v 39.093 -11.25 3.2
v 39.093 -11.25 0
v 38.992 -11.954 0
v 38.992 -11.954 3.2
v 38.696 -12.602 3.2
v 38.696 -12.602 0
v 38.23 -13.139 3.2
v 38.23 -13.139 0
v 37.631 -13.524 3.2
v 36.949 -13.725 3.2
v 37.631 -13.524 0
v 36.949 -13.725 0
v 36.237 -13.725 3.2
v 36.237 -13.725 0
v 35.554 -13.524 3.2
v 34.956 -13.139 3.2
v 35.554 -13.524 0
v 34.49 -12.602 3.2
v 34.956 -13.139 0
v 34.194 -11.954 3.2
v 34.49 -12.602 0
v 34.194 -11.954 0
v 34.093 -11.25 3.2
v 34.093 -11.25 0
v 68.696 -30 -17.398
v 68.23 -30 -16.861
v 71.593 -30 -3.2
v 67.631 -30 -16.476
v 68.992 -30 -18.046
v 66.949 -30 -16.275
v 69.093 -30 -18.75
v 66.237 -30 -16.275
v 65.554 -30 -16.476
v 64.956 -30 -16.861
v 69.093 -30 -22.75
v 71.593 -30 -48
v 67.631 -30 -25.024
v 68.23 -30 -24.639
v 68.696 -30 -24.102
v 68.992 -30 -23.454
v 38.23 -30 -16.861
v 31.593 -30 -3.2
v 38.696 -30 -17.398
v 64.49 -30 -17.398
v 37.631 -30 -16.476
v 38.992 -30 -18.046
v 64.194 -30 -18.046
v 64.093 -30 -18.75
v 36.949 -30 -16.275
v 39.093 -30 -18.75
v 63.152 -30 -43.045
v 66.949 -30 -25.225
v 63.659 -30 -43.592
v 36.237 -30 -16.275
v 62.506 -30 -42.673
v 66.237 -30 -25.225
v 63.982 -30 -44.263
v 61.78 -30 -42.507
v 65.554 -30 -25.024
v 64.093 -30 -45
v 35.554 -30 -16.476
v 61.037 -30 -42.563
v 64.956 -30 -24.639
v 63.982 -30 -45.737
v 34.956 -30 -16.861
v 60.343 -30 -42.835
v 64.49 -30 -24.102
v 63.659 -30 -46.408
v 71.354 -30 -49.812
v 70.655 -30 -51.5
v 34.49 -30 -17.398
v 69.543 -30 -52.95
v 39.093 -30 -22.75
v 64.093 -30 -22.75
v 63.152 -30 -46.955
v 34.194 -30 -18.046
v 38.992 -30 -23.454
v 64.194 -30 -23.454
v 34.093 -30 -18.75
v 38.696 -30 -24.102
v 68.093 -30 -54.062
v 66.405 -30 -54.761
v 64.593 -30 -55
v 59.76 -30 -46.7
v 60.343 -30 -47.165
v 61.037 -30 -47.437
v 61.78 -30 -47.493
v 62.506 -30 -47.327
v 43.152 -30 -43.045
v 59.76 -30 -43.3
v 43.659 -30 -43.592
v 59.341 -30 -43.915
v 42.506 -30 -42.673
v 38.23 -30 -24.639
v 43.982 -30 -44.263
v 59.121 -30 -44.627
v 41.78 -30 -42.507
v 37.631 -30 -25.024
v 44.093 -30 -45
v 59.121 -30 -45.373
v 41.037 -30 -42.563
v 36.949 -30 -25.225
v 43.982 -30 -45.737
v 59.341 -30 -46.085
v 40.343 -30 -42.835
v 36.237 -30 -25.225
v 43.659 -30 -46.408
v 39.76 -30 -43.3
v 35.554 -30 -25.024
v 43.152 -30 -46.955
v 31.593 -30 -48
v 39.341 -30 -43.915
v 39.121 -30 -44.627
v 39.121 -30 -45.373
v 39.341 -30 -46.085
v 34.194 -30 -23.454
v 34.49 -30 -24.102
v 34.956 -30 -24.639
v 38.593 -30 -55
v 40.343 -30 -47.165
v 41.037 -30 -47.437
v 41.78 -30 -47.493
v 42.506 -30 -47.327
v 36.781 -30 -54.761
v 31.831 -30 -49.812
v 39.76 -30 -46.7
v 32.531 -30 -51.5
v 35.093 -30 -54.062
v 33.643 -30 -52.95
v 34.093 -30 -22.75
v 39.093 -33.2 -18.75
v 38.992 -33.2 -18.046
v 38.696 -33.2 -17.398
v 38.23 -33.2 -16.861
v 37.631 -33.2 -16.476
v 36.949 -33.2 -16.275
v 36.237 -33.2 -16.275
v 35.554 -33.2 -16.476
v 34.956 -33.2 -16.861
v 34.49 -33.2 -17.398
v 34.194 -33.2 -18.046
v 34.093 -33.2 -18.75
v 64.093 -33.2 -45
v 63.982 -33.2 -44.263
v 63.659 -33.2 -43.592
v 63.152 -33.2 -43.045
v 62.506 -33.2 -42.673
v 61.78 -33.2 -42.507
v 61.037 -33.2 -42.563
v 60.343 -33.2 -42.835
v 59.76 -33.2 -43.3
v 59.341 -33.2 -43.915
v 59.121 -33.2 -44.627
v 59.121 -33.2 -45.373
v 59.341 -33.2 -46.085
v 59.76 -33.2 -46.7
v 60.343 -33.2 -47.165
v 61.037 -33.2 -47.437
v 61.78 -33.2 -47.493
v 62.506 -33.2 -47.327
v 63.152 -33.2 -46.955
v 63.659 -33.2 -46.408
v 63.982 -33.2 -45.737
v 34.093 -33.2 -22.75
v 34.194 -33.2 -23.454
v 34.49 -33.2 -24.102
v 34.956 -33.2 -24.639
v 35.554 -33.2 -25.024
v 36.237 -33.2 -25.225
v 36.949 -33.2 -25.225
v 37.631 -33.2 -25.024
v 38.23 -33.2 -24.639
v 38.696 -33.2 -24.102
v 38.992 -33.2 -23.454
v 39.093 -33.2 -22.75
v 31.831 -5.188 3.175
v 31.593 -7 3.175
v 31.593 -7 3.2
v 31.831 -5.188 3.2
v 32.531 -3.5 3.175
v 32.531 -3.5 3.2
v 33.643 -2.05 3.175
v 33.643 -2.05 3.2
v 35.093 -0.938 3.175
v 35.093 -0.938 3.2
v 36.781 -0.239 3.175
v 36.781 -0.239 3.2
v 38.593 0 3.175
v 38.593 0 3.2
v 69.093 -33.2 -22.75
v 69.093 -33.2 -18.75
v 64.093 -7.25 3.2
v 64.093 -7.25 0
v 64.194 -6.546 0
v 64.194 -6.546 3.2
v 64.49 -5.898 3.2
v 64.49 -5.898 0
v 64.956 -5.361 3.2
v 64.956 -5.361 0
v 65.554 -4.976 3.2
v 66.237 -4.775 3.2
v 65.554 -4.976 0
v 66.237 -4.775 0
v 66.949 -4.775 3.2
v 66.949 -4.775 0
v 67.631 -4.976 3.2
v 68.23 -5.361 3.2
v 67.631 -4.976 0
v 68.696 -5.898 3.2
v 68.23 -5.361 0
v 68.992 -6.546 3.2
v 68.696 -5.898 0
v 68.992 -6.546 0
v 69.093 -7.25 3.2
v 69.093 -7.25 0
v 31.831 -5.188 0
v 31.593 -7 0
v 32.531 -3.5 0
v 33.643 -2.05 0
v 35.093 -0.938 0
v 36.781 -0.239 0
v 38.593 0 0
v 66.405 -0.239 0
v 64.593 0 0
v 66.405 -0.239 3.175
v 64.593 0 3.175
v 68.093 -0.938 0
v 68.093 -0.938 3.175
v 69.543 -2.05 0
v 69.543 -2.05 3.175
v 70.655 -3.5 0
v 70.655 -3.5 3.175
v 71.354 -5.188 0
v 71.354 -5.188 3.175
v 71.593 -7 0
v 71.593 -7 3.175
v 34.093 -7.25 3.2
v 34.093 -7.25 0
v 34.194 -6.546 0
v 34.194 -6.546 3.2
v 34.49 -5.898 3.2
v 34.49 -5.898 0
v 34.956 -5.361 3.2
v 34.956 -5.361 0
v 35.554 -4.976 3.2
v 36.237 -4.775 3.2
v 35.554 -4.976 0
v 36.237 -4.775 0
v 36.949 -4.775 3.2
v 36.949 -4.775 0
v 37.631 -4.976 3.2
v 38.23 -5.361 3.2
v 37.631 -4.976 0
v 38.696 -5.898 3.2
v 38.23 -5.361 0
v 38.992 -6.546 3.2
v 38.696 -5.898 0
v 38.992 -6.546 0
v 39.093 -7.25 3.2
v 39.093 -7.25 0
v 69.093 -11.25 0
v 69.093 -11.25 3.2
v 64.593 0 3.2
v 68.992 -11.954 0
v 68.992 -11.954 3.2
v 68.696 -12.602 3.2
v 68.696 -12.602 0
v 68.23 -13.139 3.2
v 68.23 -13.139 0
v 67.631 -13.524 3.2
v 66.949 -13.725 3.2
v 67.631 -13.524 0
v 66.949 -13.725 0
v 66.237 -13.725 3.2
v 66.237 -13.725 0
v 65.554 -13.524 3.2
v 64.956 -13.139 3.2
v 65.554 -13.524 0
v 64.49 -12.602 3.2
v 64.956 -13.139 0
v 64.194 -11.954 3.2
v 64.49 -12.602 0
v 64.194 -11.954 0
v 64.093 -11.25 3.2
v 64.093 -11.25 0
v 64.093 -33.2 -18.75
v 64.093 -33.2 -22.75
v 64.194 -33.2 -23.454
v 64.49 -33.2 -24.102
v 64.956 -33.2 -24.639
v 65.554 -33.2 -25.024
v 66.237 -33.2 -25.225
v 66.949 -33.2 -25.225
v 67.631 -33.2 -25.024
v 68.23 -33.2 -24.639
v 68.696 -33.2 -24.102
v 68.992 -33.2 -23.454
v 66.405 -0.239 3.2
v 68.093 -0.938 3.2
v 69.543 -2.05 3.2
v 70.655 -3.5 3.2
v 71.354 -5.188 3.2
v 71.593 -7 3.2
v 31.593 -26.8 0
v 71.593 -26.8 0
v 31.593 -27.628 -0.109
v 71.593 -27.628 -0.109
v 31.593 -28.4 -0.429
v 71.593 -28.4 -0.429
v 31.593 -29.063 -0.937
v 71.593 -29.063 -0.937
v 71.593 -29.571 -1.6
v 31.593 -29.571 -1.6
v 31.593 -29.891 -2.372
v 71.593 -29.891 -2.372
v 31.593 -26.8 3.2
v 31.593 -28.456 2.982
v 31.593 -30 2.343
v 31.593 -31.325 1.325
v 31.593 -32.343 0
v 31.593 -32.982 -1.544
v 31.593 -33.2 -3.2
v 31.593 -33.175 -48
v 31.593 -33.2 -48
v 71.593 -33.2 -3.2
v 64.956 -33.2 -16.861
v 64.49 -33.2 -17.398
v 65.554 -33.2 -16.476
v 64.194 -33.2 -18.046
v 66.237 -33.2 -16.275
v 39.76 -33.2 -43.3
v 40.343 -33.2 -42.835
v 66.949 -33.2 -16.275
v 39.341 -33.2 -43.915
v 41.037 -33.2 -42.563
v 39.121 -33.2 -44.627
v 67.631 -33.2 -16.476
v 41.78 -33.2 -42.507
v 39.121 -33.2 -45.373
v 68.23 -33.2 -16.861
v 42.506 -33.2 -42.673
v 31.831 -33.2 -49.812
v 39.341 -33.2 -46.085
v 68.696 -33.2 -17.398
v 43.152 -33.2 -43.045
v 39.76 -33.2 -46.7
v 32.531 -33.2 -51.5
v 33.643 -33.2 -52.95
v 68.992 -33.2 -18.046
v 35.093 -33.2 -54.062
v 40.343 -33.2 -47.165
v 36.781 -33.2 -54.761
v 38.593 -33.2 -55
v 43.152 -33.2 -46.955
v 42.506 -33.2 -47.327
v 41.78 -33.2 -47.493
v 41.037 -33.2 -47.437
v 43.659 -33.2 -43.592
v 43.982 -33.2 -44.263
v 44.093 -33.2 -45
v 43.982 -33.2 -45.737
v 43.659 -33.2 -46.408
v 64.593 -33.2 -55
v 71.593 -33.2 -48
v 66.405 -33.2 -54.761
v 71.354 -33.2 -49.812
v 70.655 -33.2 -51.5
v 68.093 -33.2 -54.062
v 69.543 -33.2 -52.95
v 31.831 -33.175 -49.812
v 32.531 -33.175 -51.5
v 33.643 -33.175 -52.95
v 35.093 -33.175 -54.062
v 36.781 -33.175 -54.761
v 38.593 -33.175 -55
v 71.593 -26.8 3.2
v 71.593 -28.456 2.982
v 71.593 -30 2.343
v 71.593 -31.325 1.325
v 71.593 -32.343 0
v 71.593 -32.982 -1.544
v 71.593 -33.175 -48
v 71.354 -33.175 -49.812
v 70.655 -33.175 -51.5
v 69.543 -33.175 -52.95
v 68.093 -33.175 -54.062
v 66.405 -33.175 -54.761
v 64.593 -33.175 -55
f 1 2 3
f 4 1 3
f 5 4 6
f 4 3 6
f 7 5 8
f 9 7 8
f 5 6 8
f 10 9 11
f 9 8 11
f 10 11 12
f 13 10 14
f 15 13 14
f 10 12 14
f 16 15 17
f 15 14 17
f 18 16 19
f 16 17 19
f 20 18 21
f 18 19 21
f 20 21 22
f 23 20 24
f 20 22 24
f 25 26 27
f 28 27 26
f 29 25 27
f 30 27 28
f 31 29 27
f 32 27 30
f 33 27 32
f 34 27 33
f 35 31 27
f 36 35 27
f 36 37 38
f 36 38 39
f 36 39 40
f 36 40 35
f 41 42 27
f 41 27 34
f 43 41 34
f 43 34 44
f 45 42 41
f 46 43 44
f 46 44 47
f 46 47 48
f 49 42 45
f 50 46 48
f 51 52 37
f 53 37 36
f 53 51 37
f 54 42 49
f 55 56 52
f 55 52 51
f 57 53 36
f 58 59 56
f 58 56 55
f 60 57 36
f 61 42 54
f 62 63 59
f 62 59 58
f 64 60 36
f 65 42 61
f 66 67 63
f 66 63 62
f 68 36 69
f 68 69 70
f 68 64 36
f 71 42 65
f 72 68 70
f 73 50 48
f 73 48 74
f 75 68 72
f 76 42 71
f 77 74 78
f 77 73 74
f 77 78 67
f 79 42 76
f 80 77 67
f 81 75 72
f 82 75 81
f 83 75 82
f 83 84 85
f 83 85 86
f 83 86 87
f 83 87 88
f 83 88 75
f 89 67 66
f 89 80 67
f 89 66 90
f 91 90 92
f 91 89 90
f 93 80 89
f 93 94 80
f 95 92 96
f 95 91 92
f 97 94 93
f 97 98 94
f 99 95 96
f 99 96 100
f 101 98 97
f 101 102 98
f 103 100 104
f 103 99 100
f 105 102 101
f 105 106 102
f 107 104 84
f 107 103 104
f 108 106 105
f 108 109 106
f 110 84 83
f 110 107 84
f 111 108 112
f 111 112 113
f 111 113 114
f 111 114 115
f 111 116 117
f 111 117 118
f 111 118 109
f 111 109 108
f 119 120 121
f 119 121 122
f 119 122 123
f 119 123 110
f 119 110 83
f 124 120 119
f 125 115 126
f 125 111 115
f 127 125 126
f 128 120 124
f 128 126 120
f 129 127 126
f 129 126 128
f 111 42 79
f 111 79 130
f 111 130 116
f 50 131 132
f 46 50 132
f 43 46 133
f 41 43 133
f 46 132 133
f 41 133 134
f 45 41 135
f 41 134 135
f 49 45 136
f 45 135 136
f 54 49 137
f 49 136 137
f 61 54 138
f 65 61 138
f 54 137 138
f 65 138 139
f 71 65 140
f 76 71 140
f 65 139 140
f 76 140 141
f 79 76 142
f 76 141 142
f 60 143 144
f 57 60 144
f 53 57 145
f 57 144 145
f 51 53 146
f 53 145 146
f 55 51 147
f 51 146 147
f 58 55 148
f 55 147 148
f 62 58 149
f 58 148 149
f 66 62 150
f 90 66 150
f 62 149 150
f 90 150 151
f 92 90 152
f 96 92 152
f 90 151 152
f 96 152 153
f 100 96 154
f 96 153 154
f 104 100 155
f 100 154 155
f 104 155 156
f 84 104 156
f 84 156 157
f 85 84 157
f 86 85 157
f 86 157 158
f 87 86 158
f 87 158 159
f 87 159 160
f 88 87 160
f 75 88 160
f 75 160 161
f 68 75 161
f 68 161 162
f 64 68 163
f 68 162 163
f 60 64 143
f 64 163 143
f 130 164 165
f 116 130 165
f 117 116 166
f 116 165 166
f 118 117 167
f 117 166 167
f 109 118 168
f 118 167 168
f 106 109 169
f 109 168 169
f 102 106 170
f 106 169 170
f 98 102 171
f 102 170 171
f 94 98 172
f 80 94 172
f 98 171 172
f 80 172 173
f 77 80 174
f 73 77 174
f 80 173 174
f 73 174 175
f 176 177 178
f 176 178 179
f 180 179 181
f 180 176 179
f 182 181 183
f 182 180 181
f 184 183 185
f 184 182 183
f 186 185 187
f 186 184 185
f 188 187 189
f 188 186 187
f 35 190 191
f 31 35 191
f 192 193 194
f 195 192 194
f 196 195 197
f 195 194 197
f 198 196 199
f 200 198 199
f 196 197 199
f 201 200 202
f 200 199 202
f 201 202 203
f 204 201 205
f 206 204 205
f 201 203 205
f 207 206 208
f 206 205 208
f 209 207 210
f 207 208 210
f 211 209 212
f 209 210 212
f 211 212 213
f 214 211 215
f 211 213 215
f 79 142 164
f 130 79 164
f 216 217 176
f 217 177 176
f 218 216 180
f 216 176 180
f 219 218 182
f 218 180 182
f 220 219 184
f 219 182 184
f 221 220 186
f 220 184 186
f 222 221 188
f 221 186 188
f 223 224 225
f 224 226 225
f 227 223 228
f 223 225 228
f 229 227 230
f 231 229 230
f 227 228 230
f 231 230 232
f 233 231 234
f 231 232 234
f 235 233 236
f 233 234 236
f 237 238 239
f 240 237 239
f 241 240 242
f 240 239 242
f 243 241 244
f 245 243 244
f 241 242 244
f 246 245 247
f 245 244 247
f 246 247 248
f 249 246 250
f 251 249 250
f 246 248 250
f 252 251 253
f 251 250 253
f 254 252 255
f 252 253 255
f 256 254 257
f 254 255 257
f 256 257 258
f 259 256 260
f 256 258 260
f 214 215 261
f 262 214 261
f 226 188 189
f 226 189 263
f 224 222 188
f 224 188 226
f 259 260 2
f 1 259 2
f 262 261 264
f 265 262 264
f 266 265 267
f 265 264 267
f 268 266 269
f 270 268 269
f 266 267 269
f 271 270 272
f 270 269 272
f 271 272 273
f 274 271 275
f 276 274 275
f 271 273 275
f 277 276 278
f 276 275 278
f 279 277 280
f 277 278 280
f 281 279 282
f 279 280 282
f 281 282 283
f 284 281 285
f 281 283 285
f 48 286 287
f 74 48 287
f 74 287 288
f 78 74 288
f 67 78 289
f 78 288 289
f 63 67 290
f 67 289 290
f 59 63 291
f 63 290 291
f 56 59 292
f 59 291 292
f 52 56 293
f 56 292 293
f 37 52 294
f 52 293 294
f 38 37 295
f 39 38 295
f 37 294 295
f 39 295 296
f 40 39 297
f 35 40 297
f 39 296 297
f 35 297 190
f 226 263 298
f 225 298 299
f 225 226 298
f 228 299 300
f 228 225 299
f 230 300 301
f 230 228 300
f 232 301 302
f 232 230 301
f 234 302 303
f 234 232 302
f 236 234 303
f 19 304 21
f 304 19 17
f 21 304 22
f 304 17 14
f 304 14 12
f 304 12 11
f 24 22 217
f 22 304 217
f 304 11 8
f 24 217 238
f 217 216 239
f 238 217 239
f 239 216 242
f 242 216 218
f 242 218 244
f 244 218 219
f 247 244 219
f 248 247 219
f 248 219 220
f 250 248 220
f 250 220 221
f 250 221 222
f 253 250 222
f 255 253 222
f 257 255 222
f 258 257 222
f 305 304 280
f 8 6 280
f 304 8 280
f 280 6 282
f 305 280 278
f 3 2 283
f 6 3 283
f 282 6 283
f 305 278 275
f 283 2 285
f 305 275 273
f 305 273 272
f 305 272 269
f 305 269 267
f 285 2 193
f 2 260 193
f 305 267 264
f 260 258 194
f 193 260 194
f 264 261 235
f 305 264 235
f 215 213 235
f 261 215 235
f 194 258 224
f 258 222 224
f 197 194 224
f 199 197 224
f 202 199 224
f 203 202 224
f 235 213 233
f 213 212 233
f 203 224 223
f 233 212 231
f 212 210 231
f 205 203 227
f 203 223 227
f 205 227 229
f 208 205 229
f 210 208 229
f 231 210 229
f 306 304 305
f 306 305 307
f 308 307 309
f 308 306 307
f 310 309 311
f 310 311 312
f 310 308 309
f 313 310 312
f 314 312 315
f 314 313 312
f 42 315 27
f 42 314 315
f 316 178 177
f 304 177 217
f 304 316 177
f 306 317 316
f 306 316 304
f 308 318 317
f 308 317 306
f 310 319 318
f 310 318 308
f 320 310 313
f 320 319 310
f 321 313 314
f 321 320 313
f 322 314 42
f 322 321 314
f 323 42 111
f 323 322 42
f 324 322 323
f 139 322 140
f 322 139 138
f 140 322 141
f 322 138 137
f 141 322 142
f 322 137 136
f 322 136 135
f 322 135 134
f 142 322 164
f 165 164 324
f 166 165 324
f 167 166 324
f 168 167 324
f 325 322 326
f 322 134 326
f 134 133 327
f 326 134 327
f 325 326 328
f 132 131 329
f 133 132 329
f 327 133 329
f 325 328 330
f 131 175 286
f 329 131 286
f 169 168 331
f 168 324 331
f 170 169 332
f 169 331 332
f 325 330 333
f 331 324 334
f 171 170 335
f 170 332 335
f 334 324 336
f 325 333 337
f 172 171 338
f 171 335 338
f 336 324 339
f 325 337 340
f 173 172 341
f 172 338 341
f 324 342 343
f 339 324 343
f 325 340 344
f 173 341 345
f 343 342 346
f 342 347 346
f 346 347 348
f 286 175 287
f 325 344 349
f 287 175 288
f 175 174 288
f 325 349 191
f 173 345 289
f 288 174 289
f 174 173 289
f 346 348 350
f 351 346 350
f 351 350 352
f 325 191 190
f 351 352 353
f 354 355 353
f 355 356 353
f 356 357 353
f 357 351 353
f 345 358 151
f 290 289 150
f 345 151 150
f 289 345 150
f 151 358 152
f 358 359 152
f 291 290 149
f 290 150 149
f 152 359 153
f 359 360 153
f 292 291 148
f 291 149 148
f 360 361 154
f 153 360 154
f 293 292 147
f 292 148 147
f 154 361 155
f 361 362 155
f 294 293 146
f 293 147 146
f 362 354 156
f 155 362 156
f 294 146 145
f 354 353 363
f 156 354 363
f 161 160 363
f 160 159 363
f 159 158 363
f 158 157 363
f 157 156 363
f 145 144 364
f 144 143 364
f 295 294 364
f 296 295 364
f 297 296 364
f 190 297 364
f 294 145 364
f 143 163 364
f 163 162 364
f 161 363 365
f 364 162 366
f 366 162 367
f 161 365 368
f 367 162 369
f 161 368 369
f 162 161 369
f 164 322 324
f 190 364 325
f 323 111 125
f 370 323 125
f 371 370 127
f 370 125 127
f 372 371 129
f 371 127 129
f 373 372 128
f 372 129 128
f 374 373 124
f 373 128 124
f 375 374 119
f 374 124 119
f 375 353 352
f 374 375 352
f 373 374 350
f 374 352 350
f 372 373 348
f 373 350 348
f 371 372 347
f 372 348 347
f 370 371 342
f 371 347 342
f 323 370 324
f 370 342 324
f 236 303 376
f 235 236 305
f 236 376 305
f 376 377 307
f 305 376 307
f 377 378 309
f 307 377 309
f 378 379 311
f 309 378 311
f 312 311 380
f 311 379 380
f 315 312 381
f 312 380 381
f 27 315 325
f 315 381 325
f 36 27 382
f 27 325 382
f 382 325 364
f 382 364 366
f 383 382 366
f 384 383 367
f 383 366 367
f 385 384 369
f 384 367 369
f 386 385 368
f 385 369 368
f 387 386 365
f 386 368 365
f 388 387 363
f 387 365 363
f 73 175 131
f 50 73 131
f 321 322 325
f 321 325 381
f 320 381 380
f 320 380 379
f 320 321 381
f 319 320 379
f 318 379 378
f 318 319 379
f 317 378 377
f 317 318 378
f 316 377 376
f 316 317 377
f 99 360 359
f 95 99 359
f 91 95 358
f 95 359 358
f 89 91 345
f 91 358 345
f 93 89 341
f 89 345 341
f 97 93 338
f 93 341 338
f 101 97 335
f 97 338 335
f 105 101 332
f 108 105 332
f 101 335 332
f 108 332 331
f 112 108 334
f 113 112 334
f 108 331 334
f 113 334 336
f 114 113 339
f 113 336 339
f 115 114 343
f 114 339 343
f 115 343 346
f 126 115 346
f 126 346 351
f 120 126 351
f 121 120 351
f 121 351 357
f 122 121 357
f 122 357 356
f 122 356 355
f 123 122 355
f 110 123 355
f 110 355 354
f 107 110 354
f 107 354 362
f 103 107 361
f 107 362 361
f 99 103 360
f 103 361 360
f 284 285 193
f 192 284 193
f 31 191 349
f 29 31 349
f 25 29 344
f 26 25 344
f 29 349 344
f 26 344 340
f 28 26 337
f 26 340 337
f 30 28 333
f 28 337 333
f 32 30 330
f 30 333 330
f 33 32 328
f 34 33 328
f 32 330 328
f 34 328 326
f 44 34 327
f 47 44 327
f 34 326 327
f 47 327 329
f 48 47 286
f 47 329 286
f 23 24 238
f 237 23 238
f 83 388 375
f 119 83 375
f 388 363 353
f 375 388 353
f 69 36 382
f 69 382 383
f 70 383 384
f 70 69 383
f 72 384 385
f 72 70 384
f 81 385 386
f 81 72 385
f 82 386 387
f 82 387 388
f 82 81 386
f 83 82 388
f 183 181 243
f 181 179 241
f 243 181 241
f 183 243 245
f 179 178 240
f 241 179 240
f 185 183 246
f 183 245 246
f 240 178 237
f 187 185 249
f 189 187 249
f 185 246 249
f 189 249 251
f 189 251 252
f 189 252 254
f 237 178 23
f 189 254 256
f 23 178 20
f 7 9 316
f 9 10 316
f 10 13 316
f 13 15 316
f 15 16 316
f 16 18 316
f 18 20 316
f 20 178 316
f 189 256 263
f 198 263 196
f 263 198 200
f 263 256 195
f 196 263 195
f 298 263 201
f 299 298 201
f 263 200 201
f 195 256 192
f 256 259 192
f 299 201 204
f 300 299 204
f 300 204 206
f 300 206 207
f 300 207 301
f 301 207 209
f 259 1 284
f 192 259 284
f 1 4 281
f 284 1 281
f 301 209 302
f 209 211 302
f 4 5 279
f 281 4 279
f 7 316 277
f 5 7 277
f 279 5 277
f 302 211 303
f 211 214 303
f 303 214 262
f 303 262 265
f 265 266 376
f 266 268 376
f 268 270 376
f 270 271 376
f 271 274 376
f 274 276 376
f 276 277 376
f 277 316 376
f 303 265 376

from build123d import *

# Parameters (mm, degrees)
SKETCH1_W                  = 39.999999999
SKETCH1_H                  = 30
BOSS_EXTRUDE1_DEPTH        = 3.175
SKETCH3_W                  = 3.175
SKETCH3_H                  = 3.175
SKETCH3_W_2                = 25
BOSS_EXTRUDE2_DEPTH        = 40
SKETCH4_R                  = 2.5
CUT_EXTRUDE1_DEPTH         = 10
FILLET1_R                  = 7
CONVERT_SOLID1_START       = -32.140684808
CONVERT_SOLID1_OUTLINE_R   = 2.5
CONVERT_SOLID1_DEPTH       = 5.340684808
CONVERT_SOLID1_START_2     = -33.2
CONVERT_SOLID1_2_OUTLINE_R = 2.5
CONVERT_SOLID1_2_DEPTH     = 0.025
CONVERT_SOLID1_START_3     = -27.475968
CONVERT_SOLID1_3_OUTLINE_W = 39.999999999
CONVERT_SOLID1_3_OUTLINE_H = 0.025
CONVERT_SOLID1_3_DEPTH     = 27.475968
CONVERT_SOLID1_START_4     = 31.592932584
CONVERT_SOLID1_4_DEPTH     = 39.999999999
CONVERT_SOLID1_START_5     = -49
CONVERT_SOLID1_5_OUTLINE_W = 39.999999999
CONVERT_SOLID1_5_OUTLINE_H = 3.2
CONVERT_SOLID1_5_DEPTH     = 2.85856
CONVERT_SOLID1_START_6     = 3.175
CONVERT_SOLID1_6_DEPTH     = 0.825


with BuildPart() as part:
    # Sketch1 → Boss-Extrude1 (new body)
    with BuildSketch(Plane.XY):
        with Locations((51.592932584, -15)):
            Rectangle(SKETCH1_W, SKETCH1_H)
        with BuildLine():
            Line((34.092932584, -11.25), (34.092932584, -7.25))
            ThreePointArc((34.092932584, -7.25), (36.592932584, -4.75), (39.092932584, -7.25))
            Line((39.092932584, -7.25), (39.092932584, -11.25))
            ThreePointArc((39.092932584, -11.25), (36.592932584, -13.75), (34.092932584, -11.25))
        make_face(mode=Mode.SUBTRACT)
        with BuildLine():
            Line((64.092932583, -11.25), (64.092932583, -7.25))
            ThreePointArc((64.092932583, -7.25), (66.592932583, -4.75), (69.092932583, -7.25))
            Line((69.092932583, -7.25), (69.092932583, -11.25))
            ThreePointArc((69.092932583, -11.25), (66.592932583, -13.75), (64.092932583, -11.25))
        make_face(mode=Mode.SUBTRACT)
    extrude(amount=BOSS_EXTRUDE1_DEPTH)


with BuildPart() as body_2:
    # Mirror1: mirrored copy
    add(part.part.mirror(Plane(origin=(0, -15, -15), x_dir=(0, -0.7071067811865465, 0.7071067811865486), z_dir=(0, -0.7071067811865488, -0.7071067811865464))))


with BuildPart() as part_1:
    add(part.part)

    add(body_2.part)  # Boss-Extrude2 merges body 2
    # Sketch3 → Boss-Extrude2 (add, through all)
    with BuildSketch(Plane(origin=(71.592932583, 0, 0), x_dir=(0, 0, -1), z_dir=(1, 0, 0))):
        with Locations((-1.5875, -31.5875)):
            Rectangle(SKETCH3_W, SKETCH3_H)
        with Locations((42.5, -31.5875)):
            Rectangle(SKETCH3_W_2, SKETCH3_H)
    extrude(amount=-BOSS_EXTRUDE2_DEPTH)

    # Sketch4 → Cut-Extrude1 (cut)
    with BuildSketch(Plane.XZ.offset(33.175)):
        with Locations((61.592932583, -45)):
            Circle(SKETCH4_R)
        with Locations((41.592932584, -45)):
            Circle(SKETCH4_R)
    extrude(amount=-CUT_EXTRUDE1_DEPTH, mode=Mode.SUBTRACT)

    # Fillet1
    fillet1_edges = [part_1.edges().sort_by_distance(p)[0] for p in [
        (31.592932584, 0, 1.5875),
        (71.592932583, 0, 1.5875),
        (71.592932583, -31.5875, -55),
        (31.592932583, -31.5875, -55),
    ]]
    fillet(fillet1_edges, radius=FILLET1_R)

    # Convert-Solid1: read off the stored shape, not the designer's step
    # Convert-Solid1 outline → Convert-Solid1 (add)
    with BuildSketch(Plane(origin=(0, 0, 0), x_dir=(1, 0, 0), z_dir=(0, 1, 0)).offset(CONVERT_SOLID1_START)):
        with BuildLine():
            Line((31.592932584, 48), (31.592932584, 0))
            Line((31.592932584, 0), (71.592932583, 0))
            Line((71.592932583, 0), (71.592932583, 48))
            ThreePointArc((71.592932583, 48), (69.542680051, 52.949747468), (64.592932583, 55))
            Line((64.592932583, 55), (38.592932584, 55))
            ThreePointArc((38.592932584, 55), (33.643185116, 52.949747469), (31.592932584, 48))
        make_face()
        with BuildLine():
            ThreePointArc((34.092932584, 22.75), (36.592932584, 25.25), (39.092932584, 22.75))
            Line((39.092932584, 22.75), (39.092932584, 18.75))
            ThreePointArc((39.092932584, 18.75), (36.592932584, 16.25), (34.092932584, 18.75))
            Line((34.092932584, 18.75), (34.092932584, 22.75))
        make_face(mode=Mode.SUBTRACT)
        with BuildLine():
            ThreePointArc((64.092932583, 22.75), (66.592932583, 25.25), (69.092932583, 22.75))
            Line((69.092932583, 22.75), (69.092932583, 18.75))
            ThreePointArc((69.092932583, 18.75), (66.592932583, 16.25), (64.092932583, 18.75))
            Line((64.092932583, 18.75), (64.092932583, 22.75))
        make_face(mode=Mode.SUBTRACT)
        with Locations((41.592932584, 45)):
            Circle(CONVERT_SOLID1_OUTLINE_R, mode=Mode.SUBTRACT)
        with Locations((61.592932583, 45)):
            Circle(CONVERT_SOLID1_OUTLINE_R, mode=Mode.SUBTRACT)
    extrude(amount=CONVERT_SOLID1_DEPTH)

    # Convert-Solid1 2 outline → Convert-Solid1 2 (add)
    with BuildSketch(Plane(origin=(0, 0, 0), x_dir=(1, 0, 0), z_dir=(0, 1, 0)).offset(CONVERT_SOLID1_START_2)):
        with BuildLine():
            Line((31.592932584, 48), (31.592932584, 0))
            Line((31.592932584, 0), (71.592932583, 0))
            Line((71.592932583, 0), (71.592932583, 48))
            ThreePointArc((71.592932583, 48), (69.542680051, 52.949747468), (64.592932583, 55))
            Line((64.592932583, 55), (38.592932584, 55))
            ThreePointArc((38.592932584, 55), (33.643185116, 52.949747469), (31.592932584, 48))
        make_face()
        with BuildLine():
            ThreePointArc((34.092932584, 22.75), (36.592932584, 25.25), (39.092932584, 22.75))
            Line((39.092932584, 22.75), (39.092932584, 18.75))
            ThreePointArc((39.092932584, 18.75), (36.592932584, 16.25), (34.092932584, 18.75))
            Line((34.092932584, 18.75), (34.092932584, 22.75))
        make_face(mode=Mode.SUBTRACT)
        with BuildLine():
            ThreePointArc((64.092932583, 22.75), (66.592932583, 25.25), (69.092932583, 22.75))
            Line((69.092932583, 22.75), (69.092932583, 18.75))
            ThreePointArc((69.092932583, 18.75), (66.592932583, 16.25), (64.092932583, 18.75))
            Line((64.092932583, 18.75), (64.092932583, 22.75))
        make_face(mode=Mode.SUBTRACT)
        with Locations((41.592932584, 45)):
            Circle(CONVERT_SOLID1_2_OUTLINE_R, mode=Mode.SUBTRACT)
        with Locations((61.592932583, 45)):
            Circle(CONVERT_SOLID1_2_OUTLINE_R, mode=Mode.SUBTRACT)
    extrude(amount=CONVERT_SOLID1_2_DEPTH)

    # Convert-Solid1 3 outline → Convert-Solid1 3 (add)
    with BuildSketch(Plane(origin=(0, 0, 0), x_dir=(1, 0, 0), z_dir=(0, 1, 0)).offset(CONVERT_SOLID1_START_3)):
        with Locations((51.592932584, -3.1875)):
            Rectangle(CONVERT_SOLID1_3_OUTLINE_W, CONVERT_SOLID1_3_OUTLINE_H)
    extrude(amount=CONVERT_SOLID1_3_DEPTH)

    # Convert-Solid1 4 outline → Convert-Solid1 4 (cut)
    with BuildSketch(Plane.YZ.offset(CONVERT_SOLID1_START_4)):
        with BuildLine():
            ThreePointArc((-26.8, 0), (-29.0627417, -0.9372583), (-30, -3.2))
            Line((-30, -3.2), (-30, -55))
            Line((-30, -55), (-26.8, -55))
            Line((-26.8, -55), (-26.8, 0))
        make_face()
        with BuildLine():
            Line((-33.2, 0), (-33.2, -3.2))
            ThreePointArc((-33.2, -3.2), (-31.3254834, 1.3254834), (-26.8, 3.2))
            Line((-26.8, 3.2), (-27.475968, 3.2))
            Line((-27.475968, 3.2), (-27.475968, 3.175))
            Line((-27.475968, 3.175), (-33.175, 3.175))
            Line((-33.175, 3.175), (-33.175, 0))
            Line((-33.175, 0), (-33.2, 0))
        make_face()
    extrude(amount=CONVERT_SOLID1_4_DEPTH, mode=Mode.SUBTRACT)

    # Convert-Solid1 5 outline → Convert-Solid1 5 (cut)
    with BuildSketch(Plane.XY.offset(CONVERT_SOLID1_START_5)):
        with Locations((51.592932584, -28.4)):
            Rectangle(CONVERT_SOLID1_5_OUTLINE_W, CONVERT_SOLID1_5_OUTLINE_H)
    extrude(amount=CONVERT_SOLID1_5_DEPTH, mode=Mode.SUBTRACT)

    # Convert-Solid1 6 outline → Convert-Solid1 6 (cut)
    with BuildSketch(Plane.XY.offset(CONVERT_SOLID1_START_6)):
        with BuildLine():
            Line((71.592932583, -7), (71.592932583, 0))
            Line((71.592932583, 0), (64.592932583, 0))
            ThreePointArc((64.592932583, 0), (69.542680051, -2.050252532), (71.592932583, -7))
        make_face()
        with BuildLine():
            ThreePointArc((31.592932584, -7), (33.643185116, -2.050252531), (38.592932584, 0))
            Line((38.592932584, 0), (31.592932584, 0))
            Line((31.592932584, 0), (31.592932584, -7))
        make_face()
        with BuildLine():
            ThreePointArc((64.092932583, -11.25), (66.592932583, -13.75), (69.092932583, -11.25))
            Line((69.092932583, -11.25), (69.092932583, -7.25))
            ThreePointArc((69.092932583, -7.25), (66.592932583, -4.75), (64.092932583, -7.25))
            Line((64.092932583, -7.25), (64.092932583, -11.25))
        make_face()
        with BuildLine():
            ThreePointArc((34.092932584, -11.25), (36.592932584, -13.75), (39.092932584, -11.25))
            Line((39.092932584, -11.25), (39.092932584, -7.25))
            ThreePointArc((39.092932584, -7.25), (36.592932584, -4.75), (34.092932584, -7.25))
            Line((34.092932584, -7.25), (34.092932584, -11.25))
        make_face()
    extrude(amount=CONVERT_SOLID1_6_DEPTH, mode=Mode.SUBTRACT)


solid = part_1.part
